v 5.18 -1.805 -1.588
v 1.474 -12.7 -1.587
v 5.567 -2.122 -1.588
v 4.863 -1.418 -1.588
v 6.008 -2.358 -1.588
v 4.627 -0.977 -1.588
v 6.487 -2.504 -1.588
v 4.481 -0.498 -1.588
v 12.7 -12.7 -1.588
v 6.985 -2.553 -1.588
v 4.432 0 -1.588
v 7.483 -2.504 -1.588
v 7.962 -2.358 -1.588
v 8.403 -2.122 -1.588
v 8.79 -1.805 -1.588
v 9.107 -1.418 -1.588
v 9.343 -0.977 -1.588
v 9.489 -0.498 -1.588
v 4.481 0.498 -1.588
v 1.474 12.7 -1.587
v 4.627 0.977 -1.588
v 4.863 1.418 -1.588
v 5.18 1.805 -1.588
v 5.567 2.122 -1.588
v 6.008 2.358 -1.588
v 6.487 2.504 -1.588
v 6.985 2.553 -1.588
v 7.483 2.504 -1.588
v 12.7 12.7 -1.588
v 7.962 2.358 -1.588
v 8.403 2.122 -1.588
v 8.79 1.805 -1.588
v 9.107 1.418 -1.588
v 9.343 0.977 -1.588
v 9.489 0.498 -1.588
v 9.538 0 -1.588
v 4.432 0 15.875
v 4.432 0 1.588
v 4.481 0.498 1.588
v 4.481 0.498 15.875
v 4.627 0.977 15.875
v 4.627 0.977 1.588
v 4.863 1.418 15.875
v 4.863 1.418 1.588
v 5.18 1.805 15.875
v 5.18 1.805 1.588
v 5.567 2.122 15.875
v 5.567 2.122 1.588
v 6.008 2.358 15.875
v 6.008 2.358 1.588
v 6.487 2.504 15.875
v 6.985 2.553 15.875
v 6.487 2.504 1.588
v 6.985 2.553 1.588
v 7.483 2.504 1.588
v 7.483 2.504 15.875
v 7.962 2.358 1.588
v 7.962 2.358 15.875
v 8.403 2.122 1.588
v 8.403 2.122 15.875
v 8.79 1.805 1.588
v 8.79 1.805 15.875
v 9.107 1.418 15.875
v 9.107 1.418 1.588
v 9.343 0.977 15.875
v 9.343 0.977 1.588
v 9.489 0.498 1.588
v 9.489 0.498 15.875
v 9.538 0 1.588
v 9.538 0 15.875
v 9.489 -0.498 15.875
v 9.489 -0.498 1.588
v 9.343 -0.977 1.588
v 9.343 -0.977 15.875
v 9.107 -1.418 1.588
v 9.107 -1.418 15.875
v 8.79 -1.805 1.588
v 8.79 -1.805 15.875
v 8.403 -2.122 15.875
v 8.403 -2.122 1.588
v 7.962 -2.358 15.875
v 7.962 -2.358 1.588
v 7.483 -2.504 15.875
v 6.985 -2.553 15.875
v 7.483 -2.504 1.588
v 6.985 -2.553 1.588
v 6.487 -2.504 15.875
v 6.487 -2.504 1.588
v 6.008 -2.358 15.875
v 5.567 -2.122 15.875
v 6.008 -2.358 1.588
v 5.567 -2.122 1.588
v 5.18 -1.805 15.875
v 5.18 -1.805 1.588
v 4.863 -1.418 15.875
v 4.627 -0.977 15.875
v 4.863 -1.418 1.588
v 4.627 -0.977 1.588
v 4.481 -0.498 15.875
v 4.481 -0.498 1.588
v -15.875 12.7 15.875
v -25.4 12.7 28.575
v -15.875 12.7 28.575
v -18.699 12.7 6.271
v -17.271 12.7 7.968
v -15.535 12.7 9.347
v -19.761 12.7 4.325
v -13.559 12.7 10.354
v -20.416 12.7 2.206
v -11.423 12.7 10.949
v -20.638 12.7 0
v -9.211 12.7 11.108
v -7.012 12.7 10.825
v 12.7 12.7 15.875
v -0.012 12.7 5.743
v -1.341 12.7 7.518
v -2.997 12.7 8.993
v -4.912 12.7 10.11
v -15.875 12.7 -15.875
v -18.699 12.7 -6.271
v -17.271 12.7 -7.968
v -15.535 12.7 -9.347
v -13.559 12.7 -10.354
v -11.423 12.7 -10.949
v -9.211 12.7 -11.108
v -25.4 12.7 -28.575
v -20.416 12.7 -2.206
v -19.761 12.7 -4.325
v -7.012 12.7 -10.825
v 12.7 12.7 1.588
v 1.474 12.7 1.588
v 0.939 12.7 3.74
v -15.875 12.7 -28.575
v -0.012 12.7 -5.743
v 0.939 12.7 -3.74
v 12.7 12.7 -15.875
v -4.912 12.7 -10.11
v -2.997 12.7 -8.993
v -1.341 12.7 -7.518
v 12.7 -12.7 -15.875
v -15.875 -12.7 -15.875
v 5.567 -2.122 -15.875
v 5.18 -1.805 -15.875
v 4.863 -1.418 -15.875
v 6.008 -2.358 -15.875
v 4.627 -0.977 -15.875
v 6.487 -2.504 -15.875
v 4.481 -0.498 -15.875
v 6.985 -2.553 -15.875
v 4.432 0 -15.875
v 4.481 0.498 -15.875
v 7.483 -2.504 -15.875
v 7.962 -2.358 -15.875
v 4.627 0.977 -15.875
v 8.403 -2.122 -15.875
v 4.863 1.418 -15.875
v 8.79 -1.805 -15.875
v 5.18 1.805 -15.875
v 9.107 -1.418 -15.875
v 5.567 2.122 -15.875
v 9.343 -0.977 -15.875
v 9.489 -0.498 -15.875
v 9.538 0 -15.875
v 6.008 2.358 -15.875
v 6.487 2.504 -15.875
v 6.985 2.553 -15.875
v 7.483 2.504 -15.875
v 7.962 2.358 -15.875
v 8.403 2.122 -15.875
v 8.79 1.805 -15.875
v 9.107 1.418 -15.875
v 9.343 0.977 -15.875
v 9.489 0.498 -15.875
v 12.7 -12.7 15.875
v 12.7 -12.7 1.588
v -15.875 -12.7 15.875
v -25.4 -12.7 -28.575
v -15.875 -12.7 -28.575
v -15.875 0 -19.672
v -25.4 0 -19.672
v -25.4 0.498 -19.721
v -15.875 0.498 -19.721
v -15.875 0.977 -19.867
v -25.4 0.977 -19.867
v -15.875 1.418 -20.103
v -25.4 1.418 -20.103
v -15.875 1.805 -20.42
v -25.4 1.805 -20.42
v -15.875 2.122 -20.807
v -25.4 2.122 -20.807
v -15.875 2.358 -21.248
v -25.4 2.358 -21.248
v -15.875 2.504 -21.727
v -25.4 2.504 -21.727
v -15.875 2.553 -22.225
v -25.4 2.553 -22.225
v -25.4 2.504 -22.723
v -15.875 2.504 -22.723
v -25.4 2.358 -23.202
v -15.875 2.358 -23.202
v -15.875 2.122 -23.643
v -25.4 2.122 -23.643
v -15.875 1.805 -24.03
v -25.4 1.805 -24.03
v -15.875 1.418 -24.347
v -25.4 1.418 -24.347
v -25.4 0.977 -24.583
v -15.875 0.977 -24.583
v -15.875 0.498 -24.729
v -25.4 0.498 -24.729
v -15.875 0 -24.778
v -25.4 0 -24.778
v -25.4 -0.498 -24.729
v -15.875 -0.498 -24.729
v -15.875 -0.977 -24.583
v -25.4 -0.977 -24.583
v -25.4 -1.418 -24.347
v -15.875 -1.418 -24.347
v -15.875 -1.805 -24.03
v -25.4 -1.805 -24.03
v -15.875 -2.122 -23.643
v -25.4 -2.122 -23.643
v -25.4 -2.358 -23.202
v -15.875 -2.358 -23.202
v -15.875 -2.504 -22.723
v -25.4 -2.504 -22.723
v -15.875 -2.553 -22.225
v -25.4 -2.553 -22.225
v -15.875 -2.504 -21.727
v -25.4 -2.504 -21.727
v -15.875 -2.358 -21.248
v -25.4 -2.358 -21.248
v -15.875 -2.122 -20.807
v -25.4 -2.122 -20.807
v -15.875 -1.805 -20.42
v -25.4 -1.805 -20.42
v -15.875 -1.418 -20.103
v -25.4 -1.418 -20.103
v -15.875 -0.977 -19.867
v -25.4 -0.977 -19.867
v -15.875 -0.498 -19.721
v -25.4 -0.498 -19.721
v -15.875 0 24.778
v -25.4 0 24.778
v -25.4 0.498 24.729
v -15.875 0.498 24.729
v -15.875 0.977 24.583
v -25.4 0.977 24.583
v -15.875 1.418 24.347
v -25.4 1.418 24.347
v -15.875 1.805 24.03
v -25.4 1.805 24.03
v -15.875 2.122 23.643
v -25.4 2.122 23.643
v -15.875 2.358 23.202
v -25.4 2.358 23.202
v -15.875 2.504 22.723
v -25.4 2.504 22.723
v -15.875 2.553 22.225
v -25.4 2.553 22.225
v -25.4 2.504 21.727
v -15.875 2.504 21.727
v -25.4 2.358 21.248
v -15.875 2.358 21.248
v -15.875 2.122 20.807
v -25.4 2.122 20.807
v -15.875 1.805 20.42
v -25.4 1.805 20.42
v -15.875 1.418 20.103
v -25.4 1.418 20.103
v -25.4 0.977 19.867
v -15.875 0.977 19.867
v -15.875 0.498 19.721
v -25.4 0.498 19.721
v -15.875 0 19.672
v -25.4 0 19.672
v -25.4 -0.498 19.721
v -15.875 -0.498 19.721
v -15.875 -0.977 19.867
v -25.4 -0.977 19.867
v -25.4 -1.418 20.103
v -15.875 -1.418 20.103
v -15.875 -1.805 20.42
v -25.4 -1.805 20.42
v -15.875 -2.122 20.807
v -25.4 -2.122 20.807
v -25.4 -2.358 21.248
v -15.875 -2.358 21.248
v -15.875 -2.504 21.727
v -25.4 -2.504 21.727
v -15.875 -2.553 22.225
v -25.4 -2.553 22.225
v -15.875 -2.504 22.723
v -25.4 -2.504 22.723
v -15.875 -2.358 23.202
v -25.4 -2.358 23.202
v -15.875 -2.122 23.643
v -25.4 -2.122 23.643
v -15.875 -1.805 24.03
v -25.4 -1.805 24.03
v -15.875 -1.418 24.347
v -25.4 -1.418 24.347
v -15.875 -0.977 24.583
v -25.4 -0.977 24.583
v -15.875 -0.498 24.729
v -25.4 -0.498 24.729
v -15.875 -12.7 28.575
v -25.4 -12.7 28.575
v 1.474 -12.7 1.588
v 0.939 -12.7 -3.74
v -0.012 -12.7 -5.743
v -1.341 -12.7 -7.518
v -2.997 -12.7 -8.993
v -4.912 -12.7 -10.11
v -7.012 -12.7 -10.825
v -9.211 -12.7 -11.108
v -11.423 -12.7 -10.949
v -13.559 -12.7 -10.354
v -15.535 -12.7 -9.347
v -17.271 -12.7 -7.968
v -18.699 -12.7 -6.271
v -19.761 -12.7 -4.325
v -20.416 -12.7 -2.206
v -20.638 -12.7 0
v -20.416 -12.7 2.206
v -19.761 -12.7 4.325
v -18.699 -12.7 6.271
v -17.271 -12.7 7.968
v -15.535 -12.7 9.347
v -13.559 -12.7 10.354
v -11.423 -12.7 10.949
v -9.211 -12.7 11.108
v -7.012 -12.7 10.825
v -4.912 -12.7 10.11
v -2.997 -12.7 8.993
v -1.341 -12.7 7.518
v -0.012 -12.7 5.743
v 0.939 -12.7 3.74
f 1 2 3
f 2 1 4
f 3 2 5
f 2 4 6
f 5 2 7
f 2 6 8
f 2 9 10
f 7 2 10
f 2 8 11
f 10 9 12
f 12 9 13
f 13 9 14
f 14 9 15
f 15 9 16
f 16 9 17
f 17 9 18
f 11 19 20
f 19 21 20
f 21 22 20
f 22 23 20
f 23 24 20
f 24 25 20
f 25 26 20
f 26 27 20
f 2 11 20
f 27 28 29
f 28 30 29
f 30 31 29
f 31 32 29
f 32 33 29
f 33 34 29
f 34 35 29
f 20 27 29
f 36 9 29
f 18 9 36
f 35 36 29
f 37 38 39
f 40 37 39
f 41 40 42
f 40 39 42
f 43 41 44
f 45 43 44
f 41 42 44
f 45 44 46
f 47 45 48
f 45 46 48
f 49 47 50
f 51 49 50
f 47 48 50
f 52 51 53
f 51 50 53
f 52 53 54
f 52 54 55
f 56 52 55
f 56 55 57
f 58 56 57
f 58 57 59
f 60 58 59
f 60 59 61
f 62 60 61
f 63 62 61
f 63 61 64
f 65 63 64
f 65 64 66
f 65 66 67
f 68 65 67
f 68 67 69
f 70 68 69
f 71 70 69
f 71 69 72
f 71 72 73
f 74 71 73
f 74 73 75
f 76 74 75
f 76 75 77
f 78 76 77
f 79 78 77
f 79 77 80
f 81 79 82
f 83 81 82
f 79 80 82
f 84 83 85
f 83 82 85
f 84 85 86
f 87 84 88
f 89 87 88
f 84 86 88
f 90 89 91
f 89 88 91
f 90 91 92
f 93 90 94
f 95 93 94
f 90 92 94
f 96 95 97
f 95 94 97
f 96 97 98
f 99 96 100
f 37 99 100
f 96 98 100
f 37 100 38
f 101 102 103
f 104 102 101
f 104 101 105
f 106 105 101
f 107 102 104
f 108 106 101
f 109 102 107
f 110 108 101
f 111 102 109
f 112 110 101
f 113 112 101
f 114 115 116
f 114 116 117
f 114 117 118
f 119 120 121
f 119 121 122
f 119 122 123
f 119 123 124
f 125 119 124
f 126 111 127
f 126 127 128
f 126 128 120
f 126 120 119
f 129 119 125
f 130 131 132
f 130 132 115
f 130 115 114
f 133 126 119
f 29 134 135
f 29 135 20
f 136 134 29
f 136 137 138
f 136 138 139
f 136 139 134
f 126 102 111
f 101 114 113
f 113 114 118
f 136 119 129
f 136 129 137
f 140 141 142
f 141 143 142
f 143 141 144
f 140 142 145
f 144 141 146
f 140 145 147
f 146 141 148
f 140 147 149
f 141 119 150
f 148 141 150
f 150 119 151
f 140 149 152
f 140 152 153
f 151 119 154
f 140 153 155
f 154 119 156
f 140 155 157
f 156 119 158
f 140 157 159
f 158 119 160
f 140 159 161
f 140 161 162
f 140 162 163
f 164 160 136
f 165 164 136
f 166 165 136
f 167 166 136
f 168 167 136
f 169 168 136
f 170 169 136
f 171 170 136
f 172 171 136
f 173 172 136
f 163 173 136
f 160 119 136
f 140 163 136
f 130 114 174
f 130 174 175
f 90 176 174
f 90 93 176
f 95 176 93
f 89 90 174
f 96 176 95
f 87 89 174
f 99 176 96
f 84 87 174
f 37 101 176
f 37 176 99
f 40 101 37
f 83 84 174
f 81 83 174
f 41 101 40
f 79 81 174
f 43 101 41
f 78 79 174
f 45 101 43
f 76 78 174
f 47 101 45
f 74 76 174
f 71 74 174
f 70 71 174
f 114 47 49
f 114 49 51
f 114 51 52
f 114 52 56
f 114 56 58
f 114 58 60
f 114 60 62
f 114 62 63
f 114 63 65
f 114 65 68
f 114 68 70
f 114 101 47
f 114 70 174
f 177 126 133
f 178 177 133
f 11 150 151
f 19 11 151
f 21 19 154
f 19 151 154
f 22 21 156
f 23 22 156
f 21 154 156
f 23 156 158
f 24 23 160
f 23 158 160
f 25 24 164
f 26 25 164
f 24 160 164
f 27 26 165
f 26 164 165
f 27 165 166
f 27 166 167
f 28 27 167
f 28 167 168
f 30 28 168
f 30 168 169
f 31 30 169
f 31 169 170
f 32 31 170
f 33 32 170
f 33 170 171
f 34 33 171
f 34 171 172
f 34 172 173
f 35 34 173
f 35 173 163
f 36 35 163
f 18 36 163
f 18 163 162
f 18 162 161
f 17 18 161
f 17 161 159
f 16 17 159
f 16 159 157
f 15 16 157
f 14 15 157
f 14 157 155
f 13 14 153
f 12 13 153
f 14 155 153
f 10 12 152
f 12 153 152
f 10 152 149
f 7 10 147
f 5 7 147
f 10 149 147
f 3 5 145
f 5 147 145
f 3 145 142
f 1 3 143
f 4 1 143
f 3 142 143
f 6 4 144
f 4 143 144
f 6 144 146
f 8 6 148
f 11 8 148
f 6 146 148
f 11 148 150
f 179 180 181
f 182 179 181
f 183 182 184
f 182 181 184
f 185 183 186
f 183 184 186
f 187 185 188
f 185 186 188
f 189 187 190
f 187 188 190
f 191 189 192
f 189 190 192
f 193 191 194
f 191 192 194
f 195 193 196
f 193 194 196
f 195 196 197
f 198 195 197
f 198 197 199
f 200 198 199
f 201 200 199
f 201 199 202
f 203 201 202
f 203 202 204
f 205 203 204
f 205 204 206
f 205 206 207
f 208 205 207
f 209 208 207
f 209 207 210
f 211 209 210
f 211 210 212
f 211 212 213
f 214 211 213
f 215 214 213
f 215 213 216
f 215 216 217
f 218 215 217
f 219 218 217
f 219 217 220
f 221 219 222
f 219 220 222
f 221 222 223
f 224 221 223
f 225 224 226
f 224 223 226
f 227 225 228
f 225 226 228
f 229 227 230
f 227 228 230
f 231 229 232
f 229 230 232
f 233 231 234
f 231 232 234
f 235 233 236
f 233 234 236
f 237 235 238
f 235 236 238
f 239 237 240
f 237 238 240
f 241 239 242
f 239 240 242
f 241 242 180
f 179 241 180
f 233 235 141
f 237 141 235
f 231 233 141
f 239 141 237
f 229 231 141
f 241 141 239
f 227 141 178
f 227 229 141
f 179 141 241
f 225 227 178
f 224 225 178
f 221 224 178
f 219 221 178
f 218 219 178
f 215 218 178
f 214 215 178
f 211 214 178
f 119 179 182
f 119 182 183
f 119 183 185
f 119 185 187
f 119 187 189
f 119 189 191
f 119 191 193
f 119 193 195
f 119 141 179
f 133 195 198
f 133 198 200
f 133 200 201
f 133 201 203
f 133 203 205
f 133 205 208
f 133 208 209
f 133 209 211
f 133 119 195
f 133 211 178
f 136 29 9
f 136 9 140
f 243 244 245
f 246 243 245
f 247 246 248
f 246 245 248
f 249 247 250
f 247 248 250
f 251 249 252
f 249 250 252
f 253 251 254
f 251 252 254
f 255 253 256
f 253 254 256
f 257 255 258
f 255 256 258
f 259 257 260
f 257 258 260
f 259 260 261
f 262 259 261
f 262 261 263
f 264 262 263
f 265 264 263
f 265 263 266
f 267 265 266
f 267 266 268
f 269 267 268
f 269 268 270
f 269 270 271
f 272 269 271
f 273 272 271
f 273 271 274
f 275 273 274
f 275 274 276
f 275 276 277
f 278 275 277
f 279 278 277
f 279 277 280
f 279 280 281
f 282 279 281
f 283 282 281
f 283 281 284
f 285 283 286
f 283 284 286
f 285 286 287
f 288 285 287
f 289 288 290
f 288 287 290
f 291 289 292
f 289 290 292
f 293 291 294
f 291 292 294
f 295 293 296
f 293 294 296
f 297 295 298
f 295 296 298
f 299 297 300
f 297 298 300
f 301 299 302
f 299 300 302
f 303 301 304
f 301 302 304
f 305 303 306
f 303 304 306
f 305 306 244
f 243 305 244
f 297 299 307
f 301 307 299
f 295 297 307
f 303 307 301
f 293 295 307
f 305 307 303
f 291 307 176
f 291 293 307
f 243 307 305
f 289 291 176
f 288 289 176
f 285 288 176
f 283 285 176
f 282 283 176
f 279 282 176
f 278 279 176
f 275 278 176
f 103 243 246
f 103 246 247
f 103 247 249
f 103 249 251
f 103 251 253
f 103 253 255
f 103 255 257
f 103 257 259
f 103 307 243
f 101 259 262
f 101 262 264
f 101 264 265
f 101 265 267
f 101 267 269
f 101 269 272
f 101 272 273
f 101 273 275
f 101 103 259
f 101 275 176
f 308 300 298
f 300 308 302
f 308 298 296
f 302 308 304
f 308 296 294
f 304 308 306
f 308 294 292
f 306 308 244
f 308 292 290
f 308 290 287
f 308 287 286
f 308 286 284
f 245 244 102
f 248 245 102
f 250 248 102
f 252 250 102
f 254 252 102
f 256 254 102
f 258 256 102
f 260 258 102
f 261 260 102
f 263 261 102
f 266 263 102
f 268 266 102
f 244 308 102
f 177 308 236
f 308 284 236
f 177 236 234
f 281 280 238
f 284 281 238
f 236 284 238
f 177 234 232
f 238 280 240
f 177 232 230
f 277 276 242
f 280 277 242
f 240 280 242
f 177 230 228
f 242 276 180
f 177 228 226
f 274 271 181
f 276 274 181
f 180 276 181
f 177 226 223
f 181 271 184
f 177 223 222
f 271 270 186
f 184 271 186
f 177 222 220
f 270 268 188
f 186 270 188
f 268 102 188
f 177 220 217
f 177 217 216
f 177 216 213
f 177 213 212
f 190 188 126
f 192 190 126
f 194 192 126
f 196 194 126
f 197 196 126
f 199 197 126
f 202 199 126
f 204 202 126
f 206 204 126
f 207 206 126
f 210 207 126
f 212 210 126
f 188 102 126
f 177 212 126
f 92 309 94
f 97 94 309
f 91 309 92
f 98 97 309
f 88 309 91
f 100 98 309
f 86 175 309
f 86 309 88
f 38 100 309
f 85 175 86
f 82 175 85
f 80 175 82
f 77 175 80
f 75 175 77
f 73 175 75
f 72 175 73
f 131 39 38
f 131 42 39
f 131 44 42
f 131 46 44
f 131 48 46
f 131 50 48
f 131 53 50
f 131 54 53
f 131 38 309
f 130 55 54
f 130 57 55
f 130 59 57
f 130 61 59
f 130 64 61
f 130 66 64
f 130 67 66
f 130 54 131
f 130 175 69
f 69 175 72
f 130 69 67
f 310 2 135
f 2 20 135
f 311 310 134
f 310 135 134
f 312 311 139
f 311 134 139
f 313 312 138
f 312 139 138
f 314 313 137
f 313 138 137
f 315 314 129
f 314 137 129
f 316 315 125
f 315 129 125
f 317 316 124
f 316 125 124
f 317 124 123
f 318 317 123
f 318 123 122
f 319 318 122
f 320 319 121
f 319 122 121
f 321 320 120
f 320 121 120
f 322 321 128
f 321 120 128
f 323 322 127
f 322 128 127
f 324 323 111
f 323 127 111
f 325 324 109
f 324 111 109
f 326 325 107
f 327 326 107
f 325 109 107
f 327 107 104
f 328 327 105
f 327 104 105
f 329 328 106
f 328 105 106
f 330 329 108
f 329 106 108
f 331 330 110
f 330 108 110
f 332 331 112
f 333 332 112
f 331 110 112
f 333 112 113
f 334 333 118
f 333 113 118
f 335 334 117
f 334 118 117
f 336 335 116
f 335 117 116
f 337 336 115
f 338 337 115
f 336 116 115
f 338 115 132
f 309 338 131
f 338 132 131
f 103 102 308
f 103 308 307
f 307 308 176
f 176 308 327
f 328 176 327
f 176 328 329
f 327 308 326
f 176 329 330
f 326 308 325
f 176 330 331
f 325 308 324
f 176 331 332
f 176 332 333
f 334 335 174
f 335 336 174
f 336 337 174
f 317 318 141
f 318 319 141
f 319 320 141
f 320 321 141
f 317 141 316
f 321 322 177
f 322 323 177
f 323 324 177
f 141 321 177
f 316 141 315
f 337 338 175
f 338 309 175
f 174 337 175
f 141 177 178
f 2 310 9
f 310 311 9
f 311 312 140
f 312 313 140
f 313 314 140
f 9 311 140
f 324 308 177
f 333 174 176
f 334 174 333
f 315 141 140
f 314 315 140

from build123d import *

# Parameters (mm, degrees)
SKETCH1_W              = 50.8
SKETCH1_H              = 57.15
BOSS_EXTRUDE1_DEPTH    = 12.7
SKETCH2_R              = 11.1125
CUT_EXTRUDE1_DEPTH     = 46.900442536
SKETCH11_W             = 12.7
SKETCH11_H             = 57.15
CUT_EXTRUDE4_DEPTH     = 46.900442536
SKETCH3_W              = 28.575
SKETCH3_H              = 12.7
CUT_EXTRUDE2_DEPTH     = 46.900442536
F_10_CLEARANCE_HOLE1_D = 5.1054
SKETCH6_W              = 3.175
SKETCH6_H              = 37.090012852
CUT_EXTRUDE3_DEPTH     = 24.13
F_10_CLEARANCE_HOLE2_D = 5.1054


with BuildPart() as part:
    # Sketch1 → Boss-Extrude1 (new, symmetric)
    with BuildSketch(Plane(origin=(0, 0, 0), x_dir=(1, 0, 0), z_dir=(0, 1, 0))):
        Rectangle(SKETCH1_W, SKETCH1_H)
    extrude(amount=BOSS_EXTRUDE1_DEPTH, both=True)

    # Sketch2 → Cut-Extrude1 (cut, through all)
    with BuildSketch(Plane(origin=(0, 12.7, 0), x_dir=(1, 0, 0), z_dir=(0, 1, 0))):
        with Locations(Location((-9.525, 0, 0), (0, 0, 270))):
            Circle(SKETCH2_R)
    extrude(amount=-CUT_EXTRUDE1_DEPTH, mode=Mode.SUBTRACT)

    # Sketch11 → Cut-Extrude4 (cut, through all)
    with BuildSketch(Plane(origin=(0, 12.7, 0), x_dir=(1, 0, 0), z_dir=(0, 1, 0))):
        with Locations((19.05, 0)):
            Rectangle(SKETCH11_W, SKETCH11_H)
    extrude(amount=-CUT_EXTRUDE4_DEPTH, mode=Mode.SUBTRACT)

    # Sketch3 → Cut-Extrude2 (cut, through all)
    with BuildSketch(Plane(origin=(0, 12.7, 0), x_dir=(1, 0, 0), z_dir=(0, 1, 0))):
        with Locations((-1.5875, 22.225)):
            Rectangle(SKETCH3_W, SKETCH3_H)
        with Locations((-1.5875, -22.225)):
            Rectangle(SKETCH3_W, SKETCH3_H)
    extrude(amount=-CUT_EXTRUDE2_DEPTH, mode=Mode.SUBTRACT)

    # #10 Clearance Hole1 (through all)
    with Locations(Plane(origin=(-15.875, 0, 0), x_dir=(0, 0, -1), z_dir=(1, 0, 0))):
        with Locations((22.225, 0), (-22.225, 0)):
            Hole(F_10_CLEARANCE_HOLE1_D / 2)

    # Sketch6 → Cut-Extrude3 (cut)
    with BuildSketch(Plane(origin=(12.7, 0, 0), x_dir=(0, 0, -1), z_dir=(1, 0, 0))):
        Rectangle(SKETCH6_W, SKETCH6_H)
    extrude(amount=-CUT_EXTRUDE3_DEPTH, mode=Mode.SUBTRACT)

    # #10 Clearance Hole2 (through all)
    with Locations(Plane.XY.offset(15.875)):
        with Locations((6.985, 0)):
            Hole(F_10_CLEARANCE_HOLE2_D / 2)


solid = part.part
